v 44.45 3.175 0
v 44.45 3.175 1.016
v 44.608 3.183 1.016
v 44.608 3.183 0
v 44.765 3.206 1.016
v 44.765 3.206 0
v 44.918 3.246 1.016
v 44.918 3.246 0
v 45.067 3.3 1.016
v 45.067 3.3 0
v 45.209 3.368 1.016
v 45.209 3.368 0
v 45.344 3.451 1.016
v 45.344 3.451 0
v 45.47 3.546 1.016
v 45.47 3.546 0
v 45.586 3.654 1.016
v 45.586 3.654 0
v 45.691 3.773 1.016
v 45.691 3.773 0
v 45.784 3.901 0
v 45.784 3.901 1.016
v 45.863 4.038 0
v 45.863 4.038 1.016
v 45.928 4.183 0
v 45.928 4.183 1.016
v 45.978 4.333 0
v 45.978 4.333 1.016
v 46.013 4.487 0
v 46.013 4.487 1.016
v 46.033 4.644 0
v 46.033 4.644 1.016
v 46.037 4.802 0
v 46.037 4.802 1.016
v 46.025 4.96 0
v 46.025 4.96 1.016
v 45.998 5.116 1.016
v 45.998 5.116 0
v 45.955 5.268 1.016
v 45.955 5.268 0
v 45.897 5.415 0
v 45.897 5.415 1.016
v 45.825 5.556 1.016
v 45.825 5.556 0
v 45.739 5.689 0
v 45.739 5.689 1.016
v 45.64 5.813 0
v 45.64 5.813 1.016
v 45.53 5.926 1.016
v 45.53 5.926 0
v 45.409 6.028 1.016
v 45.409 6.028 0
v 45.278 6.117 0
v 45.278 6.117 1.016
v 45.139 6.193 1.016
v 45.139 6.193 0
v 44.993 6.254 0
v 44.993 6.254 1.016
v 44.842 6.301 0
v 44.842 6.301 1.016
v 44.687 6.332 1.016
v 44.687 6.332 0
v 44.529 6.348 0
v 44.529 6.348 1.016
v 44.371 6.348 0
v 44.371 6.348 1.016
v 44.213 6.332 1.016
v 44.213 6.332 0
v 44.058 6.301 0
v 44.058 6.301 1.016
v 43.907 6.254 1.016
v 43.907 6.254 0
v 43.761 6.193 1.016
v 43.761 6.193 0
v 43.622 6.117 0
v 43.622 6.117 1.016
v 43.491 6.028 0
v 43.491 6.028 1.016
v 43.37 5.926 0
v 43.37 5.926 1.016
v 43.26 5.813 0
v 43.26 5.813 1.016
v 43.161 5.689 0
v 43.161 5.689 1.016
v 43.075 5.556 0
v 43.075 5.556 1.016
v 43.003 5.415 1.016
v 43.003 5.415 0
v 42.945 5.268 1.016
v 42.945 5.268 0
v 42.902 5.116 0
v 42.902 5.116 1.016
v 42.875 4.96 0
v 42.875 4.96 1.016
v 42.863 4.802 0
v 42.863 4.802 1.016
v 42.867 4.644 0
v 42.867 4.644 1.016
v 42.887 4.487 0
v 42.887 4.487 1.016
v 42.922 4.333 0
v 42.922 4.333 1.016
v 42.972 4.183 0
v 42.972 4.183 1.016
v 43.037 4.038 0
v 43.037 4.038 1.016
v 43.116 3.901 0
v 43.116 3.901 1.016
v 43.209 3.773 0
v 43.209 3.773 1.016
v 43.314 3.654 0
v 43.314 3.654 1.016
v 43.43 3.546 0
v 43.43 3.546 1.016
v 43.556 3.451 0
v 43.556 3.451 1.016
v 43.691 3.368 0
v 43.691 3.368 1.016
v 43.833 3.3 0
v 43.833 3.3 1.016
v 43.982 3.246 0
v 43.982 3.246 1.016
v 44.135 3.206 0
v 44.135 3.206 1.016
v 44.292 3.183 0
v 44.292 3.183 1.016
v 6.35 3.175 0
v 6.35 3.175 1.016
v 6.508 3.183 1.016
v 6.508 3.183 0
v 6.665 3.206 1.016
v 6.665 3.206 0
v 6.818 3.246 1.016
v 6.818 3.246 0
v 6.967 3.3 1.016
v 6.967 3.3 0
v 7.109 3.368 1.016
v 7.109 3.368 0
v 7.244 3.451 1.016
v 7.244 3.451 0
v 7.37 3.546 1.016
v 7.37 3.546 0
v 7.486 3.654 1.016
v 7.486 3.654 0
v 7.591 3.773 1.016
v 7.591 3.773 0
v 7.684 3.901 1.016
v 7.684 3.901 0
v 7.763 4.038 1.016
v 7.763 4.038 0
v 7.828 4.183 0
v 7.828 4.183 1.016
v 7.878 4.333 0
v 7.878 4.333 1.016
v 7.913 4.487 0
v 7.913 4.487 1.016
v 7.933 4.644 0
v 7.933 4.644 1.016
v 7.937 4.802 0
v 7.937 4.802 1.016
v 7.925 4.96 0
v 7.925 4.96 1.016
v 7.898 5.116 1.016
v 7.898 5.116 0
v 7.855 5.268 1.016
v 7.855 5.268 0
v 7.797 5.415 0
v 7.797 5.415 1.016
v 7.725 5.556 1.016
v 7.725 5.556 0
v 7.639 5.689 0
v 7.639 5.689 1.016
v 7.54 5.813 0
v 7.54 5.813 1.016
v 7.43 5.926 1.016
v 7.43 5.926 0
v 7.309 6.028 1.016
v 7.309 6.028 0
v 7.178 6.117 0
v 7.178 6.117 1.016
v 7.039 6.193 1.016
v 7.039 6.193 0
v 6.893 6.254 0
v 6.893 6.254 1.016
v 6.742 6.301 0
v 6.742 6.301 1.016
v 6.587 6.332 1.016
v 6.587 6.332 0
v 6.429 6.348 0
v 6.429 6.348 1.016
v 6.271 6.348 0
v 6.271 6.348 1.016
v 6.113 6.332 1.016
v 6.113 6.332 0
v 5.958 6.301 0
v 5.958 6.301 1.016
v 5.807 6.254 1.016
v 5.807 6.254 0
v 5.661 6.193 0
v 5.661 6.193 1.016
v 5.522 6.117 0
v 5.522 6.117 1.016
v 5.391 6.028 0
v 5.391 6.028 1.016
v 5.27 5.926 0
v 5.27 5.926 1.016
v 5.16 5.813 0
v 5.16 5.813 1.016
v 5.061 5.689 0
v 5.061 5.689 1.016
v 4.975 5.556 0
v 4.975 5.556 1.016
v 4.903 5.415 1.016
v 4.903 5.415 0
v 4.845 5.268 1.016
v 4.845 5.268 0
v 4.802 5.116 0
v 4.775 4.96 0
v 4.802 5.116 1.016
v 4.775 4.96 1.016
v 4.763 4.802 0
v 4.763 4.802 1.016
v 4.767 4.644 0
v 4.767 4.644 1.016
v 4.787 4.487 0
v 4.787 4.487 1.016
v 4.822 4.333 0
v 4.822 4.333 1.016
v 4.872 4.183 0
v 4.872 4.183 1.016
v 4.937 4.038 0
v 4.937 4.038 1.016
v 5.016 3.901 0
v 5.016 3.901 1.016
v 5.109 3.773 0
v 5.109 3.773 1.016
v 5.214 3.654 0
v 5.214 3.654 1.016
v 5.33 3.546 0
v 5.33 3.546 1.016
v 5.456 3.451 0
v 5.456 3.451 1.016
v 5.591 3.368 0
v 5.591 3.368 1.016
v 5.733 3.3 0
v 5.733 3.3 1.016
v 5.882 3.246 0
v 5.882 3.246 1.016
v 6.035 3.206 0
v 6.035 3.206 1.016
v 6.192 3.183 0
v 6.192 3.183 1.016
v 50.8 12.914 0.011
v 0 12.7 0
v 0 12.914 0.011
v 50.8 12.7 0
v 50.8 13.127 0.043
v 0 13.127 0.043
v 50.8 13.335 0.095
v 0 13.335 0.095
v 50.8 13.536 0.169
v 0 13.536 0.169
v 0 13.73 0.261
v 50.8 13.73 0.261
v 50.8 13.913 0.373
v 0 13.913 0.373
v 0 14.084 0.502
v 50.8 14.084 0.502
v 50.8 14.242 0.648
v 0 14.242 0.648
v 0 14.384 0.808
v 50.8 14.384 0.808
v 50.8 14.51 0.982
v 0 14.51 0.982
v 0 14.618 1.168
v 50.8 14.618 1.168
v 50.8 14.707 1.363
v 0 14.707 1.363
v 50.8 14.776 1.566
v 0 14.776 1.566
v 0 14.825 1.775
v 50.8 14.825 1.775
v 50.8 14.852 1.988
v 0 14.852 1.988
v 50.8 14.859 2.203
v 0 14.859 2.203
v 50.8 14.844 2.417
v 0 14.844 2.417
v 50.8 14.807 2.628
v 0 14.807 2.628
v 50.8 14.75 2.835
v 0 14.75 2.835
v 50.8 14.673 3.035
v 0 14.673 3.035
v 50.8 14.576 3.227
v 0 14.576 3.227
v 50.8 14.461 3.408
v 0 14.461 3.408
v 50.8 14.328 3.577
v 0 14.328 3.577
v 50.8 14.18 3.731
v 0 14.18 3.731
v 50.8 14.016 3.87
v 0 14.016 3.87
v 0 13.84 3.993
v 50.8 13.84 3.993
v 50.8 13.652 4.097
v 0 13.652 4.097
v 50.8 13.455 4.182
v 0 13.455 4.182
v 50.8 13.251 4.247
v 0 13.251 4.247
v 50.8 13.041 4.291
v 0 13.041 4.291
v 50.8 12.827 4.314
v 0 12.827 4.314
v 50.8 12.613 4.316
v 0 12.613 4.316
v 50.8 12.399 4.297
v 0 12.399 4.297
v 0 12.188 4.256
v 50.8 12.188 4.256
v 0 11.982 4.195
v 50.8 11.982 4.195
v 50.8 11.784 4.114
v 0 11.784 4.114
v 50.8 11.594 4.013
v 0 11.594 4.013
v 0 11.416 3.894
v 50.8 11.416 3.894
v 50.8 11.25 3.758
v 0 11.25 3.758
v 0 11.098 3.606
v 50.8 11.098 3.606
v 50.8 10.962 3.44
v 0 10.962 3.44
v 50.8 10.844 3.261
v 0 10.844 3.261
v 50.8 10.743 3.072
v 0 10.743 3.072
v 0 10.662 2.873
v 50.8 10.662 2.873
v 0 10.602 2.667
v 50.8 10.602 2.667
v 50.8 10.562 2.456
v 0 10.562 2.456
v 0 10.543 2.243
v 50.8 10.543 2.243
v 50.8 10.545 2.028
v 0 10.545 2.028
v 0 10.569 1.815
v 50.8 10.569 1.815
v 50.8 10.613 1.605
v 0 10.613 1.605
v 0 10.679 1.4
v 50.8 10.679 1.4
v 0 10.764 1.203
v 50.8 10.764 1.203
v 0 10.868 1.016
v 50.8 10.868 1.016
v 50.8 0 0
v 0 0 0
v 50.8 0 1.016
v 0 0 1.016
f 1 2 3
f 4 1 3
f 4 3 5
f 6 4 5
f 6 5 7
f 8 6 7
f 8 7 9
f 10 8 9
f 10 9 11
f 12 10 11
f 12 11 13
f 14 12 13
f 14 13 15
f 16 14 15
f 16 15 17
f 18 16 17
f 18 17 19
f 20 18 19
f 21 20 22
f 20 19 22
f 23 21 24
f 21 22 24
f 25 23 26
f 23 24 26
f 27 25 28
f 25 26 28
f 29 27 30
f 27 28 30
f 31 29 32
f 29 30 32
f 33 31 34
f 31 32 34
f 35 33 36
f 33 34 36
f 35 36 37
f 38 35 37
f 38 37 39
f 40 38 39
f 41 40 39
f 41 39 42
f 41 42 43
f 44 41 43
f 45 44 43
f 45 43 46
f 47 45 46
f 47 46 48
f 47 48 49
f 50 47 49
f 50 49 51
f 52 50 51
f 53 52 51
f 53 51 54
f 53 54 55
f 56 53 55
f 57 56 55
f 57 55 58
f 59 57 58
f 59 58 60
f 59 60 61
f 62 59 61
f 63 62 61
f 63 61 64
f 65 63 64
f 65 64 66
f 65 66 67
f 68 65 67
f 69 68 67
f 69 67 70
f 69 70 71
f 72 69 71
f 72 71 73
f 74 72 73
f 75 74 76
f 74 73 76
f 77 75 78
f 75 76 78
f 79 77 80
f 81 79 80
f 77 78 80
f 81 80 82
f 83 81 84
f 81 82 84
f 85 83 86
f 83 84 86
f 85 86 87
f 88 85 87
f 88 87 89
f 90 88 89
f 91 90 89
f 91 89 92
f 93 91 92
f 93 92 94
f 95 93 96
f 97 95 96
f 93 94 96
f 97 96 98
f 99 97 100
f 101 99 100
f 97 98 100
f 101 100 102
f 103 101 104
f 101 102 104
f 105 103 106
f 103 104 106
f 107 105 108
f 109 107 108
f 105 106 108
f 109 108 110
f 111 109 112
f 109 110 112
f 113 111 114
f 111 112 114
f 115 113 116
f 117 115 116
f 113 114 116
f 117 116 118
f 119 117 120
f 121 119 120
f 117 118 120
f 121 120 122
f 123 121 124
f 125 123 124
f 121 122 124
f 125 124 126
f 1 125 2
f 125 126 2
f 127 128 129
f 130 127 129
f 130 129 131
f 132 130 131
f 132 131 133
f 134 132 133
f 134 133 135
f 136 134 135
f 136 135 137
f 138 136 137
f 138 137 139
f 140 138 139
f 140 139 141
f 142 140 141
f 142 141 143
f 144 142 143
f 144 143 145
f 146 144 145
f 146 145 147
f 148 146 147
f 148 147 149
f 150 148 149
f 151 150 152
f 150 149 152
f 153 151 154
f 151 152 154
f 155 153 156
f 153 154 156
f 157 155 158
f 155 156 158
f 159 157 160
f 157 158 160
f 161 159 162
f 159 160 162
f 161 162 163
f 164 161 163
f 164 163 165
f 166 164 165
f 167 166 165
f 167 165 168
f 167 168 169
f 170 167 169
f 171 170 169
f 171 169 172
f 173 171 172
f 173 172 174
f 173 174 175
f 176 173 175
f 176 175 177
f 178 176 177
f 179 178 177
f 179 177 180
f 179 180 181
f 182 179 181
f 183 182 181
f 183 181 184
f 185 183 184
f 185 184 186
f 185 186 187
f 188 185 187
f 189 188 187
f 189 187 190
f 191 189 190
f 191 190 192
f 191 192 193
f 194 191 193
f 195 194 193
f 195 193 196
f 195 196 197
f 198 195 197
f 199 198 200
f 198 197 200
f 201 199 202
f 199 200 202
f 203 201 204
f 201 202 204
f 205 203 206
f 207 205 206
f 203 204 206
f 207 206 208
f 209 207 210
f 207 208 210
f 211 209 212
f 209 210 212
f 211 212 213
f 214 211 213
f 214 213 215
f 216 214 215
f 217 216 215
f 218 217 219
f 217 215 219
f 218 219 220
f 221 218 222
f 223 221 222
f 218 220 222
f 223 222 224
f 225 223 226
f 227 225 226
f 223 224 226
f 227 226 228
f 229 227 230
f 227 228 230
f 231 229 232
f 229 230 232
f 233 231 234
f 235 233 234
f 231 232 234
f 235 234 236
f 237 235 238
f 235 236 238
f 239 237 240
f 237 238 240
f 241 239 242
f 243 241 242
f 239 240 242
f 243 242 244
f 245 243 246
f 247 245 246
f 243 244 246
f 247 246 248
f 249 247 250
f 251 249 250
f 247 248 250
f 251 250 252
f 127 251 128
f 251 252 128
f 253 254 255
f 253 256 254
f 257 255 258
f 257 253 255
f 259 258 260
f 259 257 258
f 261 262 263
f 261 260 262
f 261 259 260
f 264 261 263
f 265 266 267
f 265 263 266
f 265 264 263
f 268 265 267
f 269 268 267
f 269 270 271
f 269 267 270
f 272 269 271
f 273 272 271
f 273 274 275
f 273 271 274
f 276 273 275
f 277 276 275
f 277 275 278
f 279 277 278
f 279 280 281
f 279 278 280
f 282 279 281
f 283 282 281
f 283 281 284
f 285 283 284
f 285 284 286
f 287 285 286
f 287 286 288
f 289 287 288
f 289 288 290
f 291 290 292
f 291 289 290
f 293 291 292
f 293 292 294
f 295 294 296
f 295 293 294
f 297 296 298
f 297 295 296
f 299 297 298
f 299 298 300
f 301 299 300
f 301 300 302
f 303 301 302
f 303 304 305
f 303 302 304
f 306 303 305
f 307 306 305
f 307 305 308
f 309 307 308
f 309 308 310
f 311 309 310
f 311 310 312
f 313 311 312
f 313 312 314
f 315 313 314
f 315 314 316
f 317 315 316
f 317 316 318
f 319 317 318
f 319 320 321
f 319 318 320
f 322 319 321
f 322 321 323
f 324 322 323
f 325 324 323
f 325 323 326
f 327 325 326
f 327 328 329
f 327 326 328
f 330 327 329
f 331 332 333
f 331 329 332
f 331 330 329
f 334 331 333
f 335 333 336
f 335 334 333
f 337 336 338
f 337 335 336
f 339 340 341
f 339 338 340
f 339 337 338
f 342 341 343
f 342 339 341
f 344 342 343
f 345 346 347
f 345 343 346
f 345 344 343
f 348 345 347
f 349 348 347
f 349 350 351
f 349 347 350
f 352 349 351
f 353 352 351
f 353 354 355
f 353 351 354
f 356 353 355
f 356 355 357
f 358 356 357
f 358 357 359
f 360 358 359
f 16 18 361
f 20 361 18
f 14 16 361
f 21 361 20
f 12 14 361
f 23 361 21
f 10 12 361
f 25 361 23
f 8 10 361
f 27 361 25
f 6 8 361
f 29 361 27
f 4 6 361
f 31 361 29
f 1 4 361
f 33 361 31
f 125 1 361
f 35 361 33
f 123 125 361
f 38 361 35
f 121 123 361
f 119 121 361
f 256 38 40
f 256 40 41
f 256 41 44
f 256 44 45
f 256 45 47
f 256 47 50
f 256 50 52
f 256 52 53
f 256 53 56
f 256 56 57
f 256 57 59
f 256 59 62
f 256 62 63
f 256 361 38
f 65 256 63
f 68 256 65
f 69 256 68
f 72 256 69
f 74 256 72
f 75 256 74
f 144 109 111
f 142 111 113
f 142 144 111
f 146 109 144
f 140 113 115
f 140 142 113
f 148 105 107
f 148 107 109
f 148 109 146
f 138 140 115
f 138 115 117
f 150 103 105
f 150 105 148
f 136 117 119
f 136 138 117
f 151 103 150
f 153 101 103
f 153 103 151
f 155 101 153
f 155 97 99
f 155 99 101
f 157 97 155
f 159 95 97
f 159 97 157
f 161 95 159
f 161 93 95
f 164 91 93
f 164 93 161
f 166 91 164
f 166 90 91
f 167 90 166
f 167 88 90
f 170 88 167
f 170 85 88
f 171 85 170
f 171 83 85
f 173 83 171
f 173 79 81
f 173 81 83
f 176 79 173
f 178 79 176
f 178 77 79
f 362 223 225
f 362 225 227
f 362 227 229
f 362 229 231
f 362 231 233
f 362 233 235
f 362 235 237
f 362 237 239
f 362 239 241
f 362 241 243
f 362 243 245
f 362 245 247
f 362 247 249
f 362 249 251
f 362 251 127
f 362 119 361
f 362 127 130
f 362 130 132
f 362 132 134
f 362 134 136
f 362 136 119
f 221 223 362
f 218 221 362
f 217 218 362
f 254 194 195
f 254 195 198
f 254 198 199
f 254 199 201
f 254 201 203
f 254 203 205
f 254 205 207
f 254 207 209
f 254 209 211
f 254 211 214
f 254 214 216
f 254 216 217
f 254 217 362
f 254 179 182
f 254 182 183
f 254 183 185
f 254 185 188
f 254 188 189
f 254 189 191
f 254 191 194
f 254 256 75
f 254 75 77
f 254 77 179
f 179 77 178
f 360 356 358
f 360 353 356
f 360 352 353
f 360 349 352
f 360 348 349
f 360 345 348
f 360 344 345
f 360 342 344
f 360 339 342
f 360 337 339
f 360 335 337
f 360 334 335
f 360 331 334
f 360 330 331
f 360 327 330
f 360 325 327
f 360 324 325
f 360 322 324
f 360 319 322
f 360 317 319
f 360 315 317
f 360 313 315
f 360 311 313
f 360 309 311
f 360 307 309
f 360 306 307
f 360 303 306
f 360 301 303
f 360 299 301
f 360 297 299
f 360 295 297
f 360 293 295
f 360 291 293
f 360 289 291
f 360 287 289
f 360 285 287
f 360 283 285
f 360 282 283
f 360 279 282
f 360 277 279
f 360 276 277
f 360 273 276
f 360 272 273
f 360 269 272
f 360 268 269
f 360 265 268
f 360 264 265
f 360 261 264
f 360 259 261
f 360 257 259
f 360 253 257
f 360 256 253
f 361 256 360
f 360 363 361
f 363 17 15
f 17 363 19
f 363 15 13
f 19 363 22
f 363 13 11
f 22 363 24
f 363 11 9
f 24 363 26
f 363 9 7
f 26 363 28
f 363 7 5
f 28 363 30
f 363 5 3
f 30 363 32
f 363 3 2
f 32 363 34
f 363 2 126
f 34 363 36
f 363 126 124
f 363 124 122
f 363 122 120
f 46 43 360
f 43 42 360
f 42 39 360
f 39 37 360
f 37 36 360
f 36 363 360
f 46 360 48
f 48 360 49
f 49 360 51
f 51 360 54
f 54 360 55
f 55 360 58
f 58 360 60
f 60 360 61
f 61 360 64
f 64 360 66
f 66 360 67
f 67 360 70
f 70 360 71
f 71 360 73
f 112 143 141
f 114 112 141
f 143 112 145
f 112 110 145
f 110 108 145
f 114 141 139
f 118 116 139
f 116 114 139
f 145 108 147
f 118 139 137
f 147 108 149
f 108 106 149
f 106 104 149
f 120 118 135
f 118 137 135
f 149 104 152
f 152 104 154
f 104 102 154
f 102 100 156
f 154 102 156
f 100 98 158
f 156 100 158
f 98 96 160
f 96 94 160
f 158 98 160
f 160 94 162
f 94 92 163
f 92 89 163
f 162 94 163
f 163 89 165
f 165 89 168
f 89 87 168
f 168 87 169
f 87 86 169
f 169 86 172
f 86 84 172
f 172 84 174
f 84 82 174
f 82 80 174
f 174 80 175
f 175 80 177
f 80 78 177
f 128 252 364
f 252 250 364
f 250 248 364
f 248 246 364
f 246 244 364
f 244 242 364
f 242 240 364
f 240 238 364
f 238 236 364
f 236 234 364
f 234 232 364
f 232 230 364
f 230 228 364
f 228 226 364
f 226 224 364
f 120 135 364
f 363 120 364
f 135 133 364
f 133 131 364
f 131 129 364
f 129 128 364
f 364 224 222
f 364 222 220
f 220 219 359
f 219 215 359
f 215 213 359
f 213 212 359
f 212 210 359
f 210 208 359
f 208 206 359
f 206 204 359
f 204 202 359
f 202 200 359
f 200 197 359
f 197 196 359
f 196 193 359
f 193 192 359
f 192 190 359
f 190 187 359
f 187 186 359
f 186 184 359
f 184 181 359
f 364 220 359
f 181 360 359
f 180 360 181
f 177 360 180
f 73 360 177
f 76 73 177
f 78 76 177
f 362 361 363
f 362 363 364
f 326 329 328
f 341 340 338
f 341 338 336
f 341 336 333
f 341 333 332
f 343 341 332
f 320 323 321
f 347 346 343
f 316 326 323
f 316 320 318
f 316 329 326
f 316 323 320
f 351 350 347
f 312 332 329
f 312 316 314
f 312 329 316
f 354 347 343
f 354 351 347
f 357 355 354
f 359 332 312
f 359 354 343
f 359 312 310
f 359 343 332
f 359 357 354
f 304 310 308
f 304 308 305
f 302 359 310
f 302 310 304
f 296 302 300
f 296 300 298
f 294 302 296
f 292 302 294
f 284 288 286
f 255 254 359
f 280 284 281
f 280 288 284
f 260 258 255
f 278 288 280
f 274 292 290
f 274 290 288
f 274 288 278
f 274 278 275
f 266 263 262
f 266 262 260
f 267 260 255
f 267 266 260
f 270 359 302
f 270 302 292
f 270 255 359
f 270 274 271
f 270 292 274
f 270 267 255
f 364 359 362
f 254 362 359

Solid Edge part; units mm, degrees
sketch "Sketch1" plane through (0, 0, 0) normal (0, 0, 1) x (1, 0, 0)
  line L0 (0, 0) -> (0, 12.7)
  line L1 (0, 12.7) -> (50.8, 12.7)
  line L2 (50.8, 12.7) -> (50.8, 0)
  line L3 (50.8, 0) -> (0, 0)
  dimension "D1" = 50.8
  dimension "D2" = 12.7
extrude "Protrusion1" add sketch "Sketch1" along normal blind 1.016
sketch "Sketch2" plane through (50.8, 9.525, 0.381) normal (1, 0, 0) x (0, 1, 0)
  circle A0 centre (3.175, 1.778) radius 2.159
  dimension "D1" = 4.318
extrude "ExtrudedProtrusion_2" add sketch "Sketch2" against normal blind 50.8
hole "Hole_1" at (44.45, 4.7625, 1.016) direction (0, 0, -1) diameter 3.175 end up to next
hole "Hole1" at (6.35, 4.7625, 1.016) direction (0, 0, -1) diameter 3.175 end up to next
properties part number "HARDWARE" material "Steel"
